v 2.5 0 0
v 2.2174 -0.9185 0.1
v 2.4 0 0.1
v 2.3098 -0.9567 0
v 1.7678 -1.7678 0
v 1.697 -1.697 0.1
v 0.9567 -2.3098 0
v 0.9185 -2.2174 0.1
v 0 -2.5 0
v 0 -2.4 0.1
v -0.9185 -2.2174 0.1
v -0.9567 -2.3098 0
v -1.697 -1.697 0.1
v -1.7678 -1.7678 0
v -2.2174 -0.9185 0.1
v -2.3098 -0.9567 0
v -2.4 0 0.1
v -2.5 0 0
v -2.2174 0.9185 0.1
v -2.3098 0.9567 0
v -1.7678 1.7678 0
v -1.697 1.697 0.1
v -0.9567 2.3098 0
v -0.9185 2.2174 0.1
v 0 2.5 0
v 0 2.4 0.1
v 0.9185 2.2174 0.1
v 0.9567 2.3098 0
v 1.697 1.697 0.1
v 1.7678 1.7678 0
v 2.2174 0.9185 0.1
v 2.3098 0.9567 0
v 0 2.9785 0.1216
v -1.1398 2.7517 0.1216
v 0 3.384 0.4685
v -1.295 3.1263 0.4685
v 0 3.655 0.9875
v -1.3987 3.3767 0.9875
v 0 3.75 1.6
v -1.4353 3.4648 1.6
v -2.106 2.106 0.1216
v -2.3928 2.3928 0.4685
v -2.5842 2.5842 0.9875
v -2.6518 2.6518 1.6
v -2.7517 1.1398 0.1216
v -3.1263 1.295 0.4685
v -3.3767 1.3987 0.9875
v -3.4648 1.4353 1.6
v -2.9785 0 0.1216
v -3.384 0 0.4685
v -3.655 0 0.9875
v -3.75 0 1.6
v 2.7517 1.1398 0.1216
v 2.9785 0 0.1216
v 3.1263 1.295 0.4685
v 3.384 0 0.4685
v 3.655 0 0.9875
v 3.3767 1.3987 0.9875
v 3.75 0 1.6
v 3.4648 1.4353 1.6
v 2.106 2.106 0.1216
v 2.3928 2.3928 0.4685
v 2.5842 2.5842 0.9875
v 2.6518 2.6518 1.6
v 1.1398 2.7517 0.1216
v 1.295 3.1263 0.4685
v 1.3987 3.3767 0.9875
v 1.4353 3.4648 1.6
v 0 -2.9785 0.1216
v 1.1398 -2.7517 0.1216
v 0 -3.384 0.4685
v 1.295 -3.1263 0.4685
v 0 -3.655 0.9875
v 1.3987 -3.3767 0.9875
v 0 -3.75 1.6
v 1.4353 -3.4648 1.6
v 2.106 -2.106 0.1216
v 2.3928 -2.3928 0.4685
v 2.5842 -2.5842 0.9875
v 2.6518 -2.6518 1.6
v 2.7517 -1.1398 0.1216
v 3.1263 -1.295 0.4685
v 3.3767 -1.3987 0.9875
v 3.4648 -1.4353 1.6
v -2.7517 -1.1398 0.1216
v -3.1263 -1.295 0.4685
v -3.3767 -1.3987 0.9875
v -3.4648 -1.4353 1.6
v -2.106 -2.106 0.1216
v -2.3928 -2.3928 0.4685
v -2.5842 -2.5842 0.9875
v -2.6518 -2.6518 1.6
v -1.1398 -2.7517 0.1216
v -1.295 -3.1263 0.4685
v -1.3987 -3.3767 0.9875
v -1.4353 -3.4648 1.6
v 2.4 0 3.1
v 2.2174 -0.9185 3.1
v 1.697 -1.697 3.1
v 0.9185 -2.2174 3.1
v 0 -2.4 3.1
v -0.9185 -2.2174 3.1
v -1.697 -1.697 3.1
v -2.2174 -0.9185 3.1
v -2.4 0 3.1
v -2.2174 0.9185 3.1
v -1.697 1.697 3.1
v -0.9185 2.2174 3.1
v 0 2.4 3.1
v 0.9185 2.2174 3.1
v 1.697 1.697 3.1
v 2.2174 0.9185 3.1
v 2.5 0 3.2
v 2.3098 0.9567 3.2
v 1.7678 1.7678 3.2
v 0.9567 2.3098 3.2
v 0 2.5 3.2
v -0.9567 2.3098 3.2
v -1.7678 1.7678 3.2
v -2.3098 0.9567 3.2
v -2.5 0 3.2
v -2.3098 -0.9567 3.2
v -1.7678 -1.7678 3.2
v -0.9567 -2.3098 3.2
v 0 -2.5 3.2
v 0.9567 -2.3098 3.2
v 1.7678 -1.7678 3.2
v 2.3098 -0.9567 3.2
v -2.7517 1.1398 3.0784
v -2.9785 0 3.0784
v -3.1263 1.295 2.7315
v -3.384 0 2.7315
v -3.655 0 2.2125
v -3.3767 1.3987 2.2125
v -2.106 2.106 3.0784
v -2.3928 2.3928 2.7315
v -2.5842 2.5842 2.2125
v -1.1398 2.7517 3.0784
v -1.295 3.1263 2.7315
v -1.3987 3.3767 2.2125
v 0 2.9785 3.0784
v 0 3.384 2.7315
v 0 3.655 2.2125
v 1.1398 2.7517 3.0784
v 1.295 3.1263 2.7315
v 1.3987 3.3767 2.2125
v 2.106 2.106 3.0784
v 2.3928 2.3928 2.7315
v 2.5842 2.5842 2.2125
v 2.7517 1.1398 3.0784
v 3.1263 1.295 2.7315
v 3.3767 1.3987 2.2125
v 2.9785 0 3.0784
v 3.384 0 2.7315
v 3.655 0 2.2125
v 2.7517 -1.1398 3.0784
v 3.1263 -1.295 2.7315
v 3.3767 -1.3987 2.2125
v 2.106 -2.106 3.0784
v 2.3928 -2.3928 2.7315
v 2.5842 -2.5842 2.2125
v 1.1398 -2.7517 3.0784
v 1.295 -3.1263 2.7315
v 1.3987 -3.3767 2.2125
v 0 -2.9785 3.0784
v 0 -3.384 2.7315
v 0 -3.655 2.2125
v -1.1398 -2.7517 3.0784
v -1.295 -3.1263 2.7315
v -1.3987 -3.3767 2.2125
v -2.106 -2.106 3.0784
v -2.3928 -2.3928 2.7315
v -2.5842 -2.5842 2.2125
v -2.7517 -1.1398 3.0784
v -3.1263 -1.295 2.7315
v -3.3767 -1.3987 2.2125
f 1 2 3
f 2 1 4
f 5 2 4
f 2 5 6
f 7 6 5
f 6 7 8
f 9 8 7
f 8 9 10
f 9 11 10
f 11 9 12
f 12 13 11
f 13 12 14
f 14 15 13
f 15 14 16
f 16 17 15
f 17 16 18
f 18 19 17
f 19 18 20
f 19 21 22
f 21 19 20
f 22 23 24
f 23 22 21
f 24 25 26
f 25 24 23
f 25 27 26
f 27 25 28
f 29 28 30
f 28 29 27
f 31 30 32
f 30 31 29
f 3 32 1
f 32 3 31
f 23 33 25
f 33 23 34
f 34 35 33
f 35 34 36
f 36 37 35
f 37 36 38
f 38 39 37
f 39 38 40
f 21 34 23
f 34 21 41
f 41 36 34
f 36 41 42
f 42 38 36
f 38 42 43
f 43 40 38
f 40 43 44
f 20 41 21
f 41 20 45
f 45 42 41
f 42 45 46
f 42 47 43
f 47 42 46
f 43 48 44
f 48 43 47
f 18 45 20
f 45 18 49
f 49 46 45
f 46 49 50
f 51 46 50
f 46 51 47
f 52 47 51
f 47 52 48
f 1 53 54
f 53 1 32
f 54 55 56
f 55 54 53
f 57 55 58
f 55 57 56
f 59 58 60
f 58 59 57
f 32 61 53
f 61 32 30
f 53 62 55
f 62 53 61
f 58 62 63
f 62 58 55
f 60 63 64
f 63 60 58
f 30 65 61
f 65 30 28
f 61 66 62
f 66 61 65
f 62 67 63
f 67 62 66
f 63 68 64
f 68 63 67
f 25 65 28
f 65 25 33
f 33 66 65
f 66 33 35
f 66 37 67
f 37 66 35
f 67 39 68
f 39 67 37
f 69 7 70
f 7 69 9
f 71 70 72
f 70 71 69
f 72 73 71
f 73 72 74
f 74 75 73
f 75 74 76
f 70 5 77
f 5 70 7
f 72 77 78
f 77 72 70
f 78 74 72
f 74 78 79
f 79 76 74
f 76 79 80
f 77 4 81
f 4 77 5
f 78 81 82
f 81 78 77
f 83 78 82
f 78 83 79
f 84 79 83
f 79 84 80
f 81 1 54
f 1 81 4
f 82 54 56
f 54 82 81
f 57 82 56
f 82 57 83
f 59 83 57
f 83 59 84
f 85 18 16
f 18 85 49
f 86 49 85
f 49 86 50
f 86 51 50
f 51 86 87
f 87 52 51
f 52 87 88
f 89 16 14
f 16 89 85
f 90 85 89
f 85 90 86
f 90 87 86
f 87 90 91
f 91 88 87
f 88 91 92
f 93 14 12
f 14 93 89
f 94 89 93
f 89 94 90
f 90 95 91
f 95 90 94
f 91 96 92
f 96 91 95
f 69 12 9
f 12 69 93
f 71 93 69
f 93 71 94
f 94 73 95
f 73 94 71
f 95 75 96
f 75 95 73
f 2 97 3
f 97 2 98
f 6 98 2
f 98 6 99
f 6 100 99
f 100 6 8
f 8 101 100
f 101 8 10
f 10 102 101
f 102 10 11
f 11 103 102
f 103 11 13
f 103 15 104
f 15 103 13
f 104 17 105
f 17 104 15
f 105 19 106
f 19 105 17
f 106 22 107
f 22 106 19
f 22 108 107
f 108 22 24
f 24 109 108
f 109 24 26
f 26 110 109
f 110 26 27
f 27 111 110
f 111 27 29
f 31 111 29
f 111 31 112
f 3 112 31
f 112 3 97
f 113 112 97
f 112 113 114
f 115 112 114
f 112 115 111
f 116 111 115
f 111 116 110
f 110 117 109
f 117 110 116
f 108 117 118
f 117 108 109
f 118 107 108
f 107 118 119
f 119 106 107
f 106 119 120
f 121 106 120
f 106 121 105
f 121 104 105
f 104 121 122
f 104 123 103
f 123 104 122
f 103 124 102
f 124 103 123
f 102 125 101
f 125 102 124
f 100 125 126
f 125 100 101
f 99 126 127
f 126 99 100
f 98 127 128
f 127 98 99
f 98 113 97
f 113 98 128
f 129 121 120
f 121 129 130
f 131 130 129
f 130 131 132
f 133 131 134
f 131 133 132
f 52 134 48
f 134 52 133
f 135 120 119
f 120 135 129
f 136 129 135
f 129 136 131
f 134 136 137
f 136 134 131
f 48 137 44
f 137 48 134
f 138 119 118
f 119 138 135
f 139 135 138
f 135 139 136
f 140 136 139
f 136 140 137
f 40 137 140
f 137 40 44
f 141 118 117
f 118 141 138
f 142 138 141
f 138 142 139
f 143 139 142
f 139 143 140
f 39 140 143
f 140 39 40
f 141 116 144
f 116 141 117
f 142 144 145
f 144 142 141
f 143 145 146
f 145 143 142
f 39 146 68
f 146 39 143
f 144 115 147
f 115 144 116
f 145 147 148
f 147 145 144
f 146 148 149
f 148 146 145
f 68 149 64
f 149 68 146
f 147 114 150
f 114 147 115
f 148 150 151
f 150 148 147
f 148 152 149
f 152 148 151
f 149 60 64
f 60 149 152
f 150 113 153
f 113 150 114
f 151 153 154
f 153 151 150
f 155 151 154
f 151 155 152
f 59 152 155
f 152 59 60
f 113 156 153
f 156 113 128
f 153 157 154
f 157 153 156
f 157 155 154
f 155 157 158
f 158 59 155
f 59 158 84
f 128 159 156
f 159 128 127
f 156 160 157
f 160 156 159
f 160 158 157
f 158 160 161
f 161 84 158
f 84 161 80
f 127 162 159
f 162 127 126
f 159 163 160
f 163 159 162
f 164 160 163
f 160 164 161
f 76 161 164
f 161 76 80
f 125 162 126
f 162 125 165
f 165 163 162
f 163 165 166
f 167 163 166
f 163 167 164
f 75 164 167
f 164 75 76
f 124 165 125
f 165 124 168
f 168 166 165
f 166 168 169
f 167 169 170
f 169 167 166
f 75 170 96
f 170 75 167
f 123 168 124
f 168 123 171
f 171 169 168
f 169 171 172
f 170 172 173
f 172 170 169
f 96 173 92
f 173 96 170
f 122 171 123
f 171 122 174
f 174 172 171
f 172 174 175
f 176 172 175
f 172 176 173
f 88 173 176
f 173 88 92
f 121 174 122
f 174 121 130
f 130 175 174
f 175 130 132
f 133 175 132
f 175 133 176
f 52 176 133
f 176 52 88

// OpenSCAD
// file: ../p/4-4cyli.scad
use <../lib.scad>
function ldraw_lib__4_4cyli() = [
// 0 Cylinder 1.0
// 0 Name: 4-4cyli.dat
// 0 Author: James Jessiman
// 0 !LDRAW_ORG Primitive UPDATE 2005-01
// 0 !LICENSE Licensed under CC BY 2.0 and CC BY 4.0 : see CAreadme.txt
// 
// 0 BFC CERTIFY CCW
  [0,"BFC","CERTIFY"],
  [0,"BFC","CCW"],
// 
// 0 !HISTORY 1998-12-15 [PTadmin] Official Update 1998-10
// 0 !HISTORY 2002-03-23 [sbliss] Added BFC statement; merged headers from files in distributions LDraw 0.27 and Complete.
// 0 !HISTORY 2002-04-25 [PTadmin] Official Update 2002-02
// 0 !HISTORY 2004-12-14 [guyvivan] BFC CCW
// 0 !HISTORY 2005-12-28 [PTadmin] Official Update 2005-01
// 0 !HISTORY 2007-06-24 [PTadmin] Header formatted for Contributor Agreement
// 0 !HISTORY 2008-07-01 [PTadmin] Official Update 2008-01
// 
// 
// 4 16 1 1 0 0.9239 1 0.3827 0.9239 0 0.3827 1 0 0
  [4,16,1,1,0,0.9239,1,0.3827,0.9239,0,0.3827,1,0,0],
// 5 24 1 0 0 1 1 0 0.9239 0 0.3827 0.9239 0 -0.3827
  [5,24,1,0,0,1,1,0,0.9239,0,0.3827,0.9239,0,-0.3827],
// 4 16 0.9239 1 0.3827 0.7071 1 0.7071 0.7071 0 0.7071 0.9239 0 0.3827
  [4,16,0.9239,1,0.3827,0.7071,1,0.7071,0.7071,0,0.7071,0.9239,0,0.3827],
// 5 24 0.9239 0 0.3827 0.9239 1 0.3827 0.7071 0 0.7071 1 0 0
  [5,24,0.9239,0,0.3827,0.9239,1,0.3827,0.7071,0,0.7071,1,0,0],
// 4 16 0.7071 1 0.7071 0.3827 1 0.9239 0.3827 0 0.9239 0.7071 0 0.7071
  [4,16,0.7071,1,0.7071,0.3827,1,0.9239,0.3827,0,0.9239,0.7071,0,0.7071],
// 5 24 0.7071 0 0.7071 0.7071 1 0.7071 0.3827 0 0.9239 0.9239 0 0.3827
  [5,24,0.7071,0,0.7071,0.7071,1,0.7071,0.3827,0,0.9239,0.9239,0,0.3827],
// 4 16 0.3827 1 0.9239 0 1 1 0 0 1 0.3827 0 0.9239
  [4,16,0.3827,1,0.9239,0,1,1,0,0,1,0.3827,0,0.9239],
// 5 24 0.3827 0 0.9239 0.3827 1 0.9239 0 0 1 0.7071 0 0.7071
  [5,24,0.3827,0,0.9239,0.3827,1,0.9239,0,0,1,0.7071,0,0.7071],
// 4 16 0 1 1 -0.3827 1 0.9239 -0.3827 0 0.9239 0 0 1
  [4,16,0,1,1,-0.3827,1,0.9239,-0.3827,0,0.9239,0,0,1],
// 5 24 0 0 1 0 1 1 -0.3827 0 0.9239 0.3827 0 0.9239
  [5,24,0,0,1,0,1,1,-0.3827,0,0.9239,0.3827,0,0.9239],
// 4 16 -0.3827 1 0.9239 -0.7071 1 0.7071 -0.7071 0 0.7071 -0.3827 0 0.9239
  [4,16,-0.3827,1,0.9239,-0.7071,1,0.7071,-0.7071,0,0.7071,-0.3827,0,0.9239],
// 5 24 -0.3827 0 0.9239 -0.3827 1 0.9239 -0.7071 0 0.7071 0 0 1
  [5,24,-0.3827,0,0.9239,-0.3827,1,0.9239,-0.7071,0,0.7071,0,0,1],
// 4 16 -0.7071 1 0.7071 -0.9239 1 0.3827 -0.9239 0 0.3827 -0.7071 0 0.7071
  [4,16,-0.7071,1,0.7071,-0.9239,1,0.3827,-0.9239,0,0.3827,-0.7071,0,0.7071],
// 5 24 -0.7071 0 0.7071 -0.7071 1 0.7071 -0.9239 0 0.3827 -0.3827 0 0.9239
  [5,24,-0.7071,0,0.7071,-0.7071,1,0.7071,-0.9239,0,0.3827,-0.3827,0,0.9239],
// 4 16 -0.9239 1 0.3827 -1 1 0 -1 0 0 -0.9239 0 0.3827
  [4,16,-0.9239,1,0.3827,-1,1,0,-1,0,0,-0.9239,0,0.3827],
// 5 24 -0.9239 0 0.3827 -0.9239 1 0.3827 -1 0 0 -0.7071 0 0.7071
  [5,24,-0.9239,0,0.3827,-0.9239,1,0.3827,-1,0,0,-0.7071,0,0.7071],
// 4 16 -1 1 0 -0.9239 1 -0.3827 -0.9239 0 -0.3827 -1 0 0
  [4,16,-1,1,0,-0.9239,1,-0.3827,-0.9239,0,-0.3827,-1,0,0],
// 5 24 -1 0 0 -1 1 0 -0.9239 0 -0.3827 -0.9239 0 0.3827
  [5,24,-1,0,0,-1,1,0,-0.9239,0,-0.3827,-0.9239,0,0.3827],
// 4 16 -0.9239 1 -0.3827 -0.7071 1 -0.7071 -0.7071 0 -0.7071 -0.9239 0 -0.3827
  [4,16,-0.9239,1,-0.3827,-0.7071,1,-0.7071,-0.7071,0,-0.7071,-0.9239,0,-0.3827],
// 5 24 -0.9239 0 -0.3827 -0.9239 1 -0.3827 -0.7071 0 -0.7071 -1 0 0
  [5,24,-0.9239,0,-0.3827,-0.9239,1,-0.3827,-0.7071,0,-0.7071,-1,0,0],
// 4 16 -0.7071 1 -0.7071 -0.3827 1 -0.9239 -0.3827 0 -0.9239 -0.7071 0 -0.7071
  [4,16,-0.7071,1,-0.7071,-0.3827,1,-0.9239,-0.3827,0,-0.9239,-0.7071,0,-0.7071],
// 5 24 -0.7071 0 -0.7071 -0.7071 1 -0.7071 -0.3827 0 -0.9239 -0.9239 0 -0.3827
  [5,24,-0.7071,0,-0.7071,-0.7071,1,-0.7071,-0.3827,0,-0.9239,-0.9239,0,-0.3827],
// 4 16 -0.3827 1 -0.9239 0 1 -1 0 0 -1 -0.3827 0 -0.9239
  [4,16,-0.3827,1,-0.9239,0,1,-1,0,0,-1,-0.3827,0,-0.9239],
// 5 24 -0.3827 0 -0.9239 -0.3827 1 -0.9239 0 0 -1 -0.7071 0 -0.7071
  [5,24,-0.3827,0,-0.9239,-0.3827,1,-0.9239,0,0,-1,-0.7071,0,-0.7071],
// 4 16 0 1 -1 0.3827 1 -0.9239 0.3827 0 -0.9239 0 0 -1
  [4,16,0,1,-1,0.3827,1,-0.9239,0.3827,0,-0.9239,0,0,-1],
// 5 24 0 0 -1 0 1 -1 0.3827 0 -0.9239 -0.3827 0 -0.9239
  [5,24,0,0,-1,0,1,-1,0.3827,0,-0.9239,-0.3827,0,-0.9239],
// 4 16 0.3827 1 -0.9239 0.7071 1 -0.7071 0.7071 0 -0.7071 0.3827 0 -0.9239
  [4,16,0.3827,1,-0.9239,0.7071,1,-0.7071,0.7071,0,-0.7071,0.3827,0,-0.9239],
// 5 24 0.3827 0 -0.9239 0.3827 1 -0.9239 0.7071 0 -0.7071 0 0 -1
  [5,24,0.3827,0,-0.9239,0.3827,1,-0.9239,0.7071,0,-0.7071,0,0,-1],
// 4 16 0.7071 1 -0.7071 0.9239 1 -0.3827 0.9239 0 -0.3827 0.7071 0 -0.7071
  [4,16,0.7071,1,-0.7071,0.9239,1,-0.3827,0.9239,0,-0.3827,0.7071,0,-0.7071],
// 5 24 0.7071 0 -0.7071 0.7071 1 -0.7071 0.9239 0 -0.3827 0.3827 0 -0.9239
  [5,24,0.7071,0,-0.7071,0.7071,1,-0.7071,0.9239,0,-0.3827,0.3827,0,-0.9239],
// 4 16 0.9239 1 -0.3827 1 1 0 1 0 0 0.9239 0 -0.3827
  [4,16,0.9239,1,-0.3827,1,1,0,1,0,0,0.9239,0,-0.3827],
// 5 24 0.9239 0 -0.3827 0.9239 1 -0.3827 1 0 0 0.7071 0 -0.7071
  [5,24,0.9239,0,-0.3827,0.9239,1,-0.3827,1,0,0,0.7071,0,-0.7071],
// 0
];
makepoly(ldraw_lib__4_4cyli(), line=0.2);
// file: ../p/4-4con24.scad
use <../lib.scad>
function ldraw_lib__4_4con24() = [
// 0 Cone 24 x 1.0
// 0 Name: 4-4con24.dat
// 0 Author: Michael Heidemann [mikeheide]
// 0 !LDRAW_ORG Primitive UPDATE 2010-03
// 0 !LICENSE Licensed under CC BY 2.0 and CC BY 4.0 : see CAreadme.txt
// 
// 0 BFC CERTIFY CCW
  [0,"BFC","CERTIFY"],
  [0,"BFC","CCW"],
// 
// 0 !HISTORY 2010-12-31 [PTadmin] Official Update 2010-03
// 
// 
// 4 16 24 1 0 22.1736 1 9.1848 23.0975 0 9.5675 25 0 0
  [4,16,24,1,0,22.1736,1,9.1848,23.0975,0,9.5675,25,0,0],
// 4 16 22.1736 1 9.1848 16.9704 1 16.9704 17.6775 0 17.6775 23.0975 0 9.5675
  [4,16,22.1736,1,9.1848,16.9704,1,16.9704,17.6775,0,17.6775,23.0975,0,9.5675],
// 4 16 16.9704 1 16.9704 9.1848 1 22.1736 9.5675 0 23.0975 17.6775 0 17.6775
  [4,16,16.9704,1,16.9704,9.1848,1,22.1736,9.5675,0,23.0975,17.6775,0,17.6775],
// 4 16 9.1848 1 22.1736 0 1 24 0 0 25 9.5675 0 23.0975
  [4,16,9.1848,1,22.1736,0,1,24,0,0,25,9.5675,0,23.0975],
// 4 16 0 1 24 -9.1848 1 22.1736 -9.5675 0 23.0975 0 0 25
  [4,16,0,1,24,-9.1848,1,22.1736,-9.5675,0,23.0975,0,0,25],
// 4 16 -9.1848 1 22.1736 -16.9704 1 16.9704 -17.6775 0 17.6775 -9.5675 0 23.0975
  [4,16,-9.1848,1,22.1736,-16.9704,1,16.9704,-17.6775,0,17.6775,-9.5675,0,23.0975],
// 4 16 -16.9704 1 16.9704 -22.1736 1 9.1848 -23.0975 0 9.5675 -17.6775 0 17.6775
  [4,16,-16.9704,1,16.9704,-22.1736,1,9.1848,-23.0975,0,9.5675,-17.6775,0,17.6775],
// 4 16 -22.1736 1 9.1848 -24 1 0 -25 0 0 -23.0975 0 9.5675
  [4,16,-22.1736,1,9.1848,-24,1,0,-25,0,0,-23.0975,0,9.5675],
// 4 16 -24 1 0 -22.1736 1 -9.1848 -23.0975 0 -9.5675 -25 0 0
  [4,16,-24,1,0,-22.1736,1,-9.1848,-23.0975,0,-9.5675,-25,0,0],
// 4 16 -22.1736 1 -9.1848 -16.9704 1 -16.9704 -17.6775 0 -17.6775 -23.0975 0 -9.5675
  [4,16,-22.1736,1,-9.1848,-16.9704,1,-16.9704,-17.6775,0,-17.6775,-23.0975,0,-9.5675],
// 4 16 -16.9704 1 -16.9704 -9.1848 1 -22.1736 -9.5675 0 -23.0975 -17.6775 0 -17.6775
  [4,16,-16.9704,1,-16.9704,-9.1848,1,-22.1736,-9.5675,0,-23.0975,-17.6775,0,-17.6775],
// 4 16 -9.1848 1 -22.1736 0 1 -24 0 0 -25 -9.5675 0 -23.0975
  [4,16,-9.1848,1,-22.1736,0,1,-24,0,0,-25,-9.5675,0,-23.0975],
// 4 16 0 1 -24 9.1848 1 -22.1736 9.5675 0 -23.0975 0 0 -25
  [4,16,0,1,-24,9.1848,1,-22.1736,9.5675,0,-23.0975,0,0,-25],
// 4 16 9.1848 1 -22.1736 16.9704 1 -16.9704 17.6775 0 -17.6775 9.5675 0 -23.0975
  [4,16,9.1848,1,-22.1736,16.9704,1,-16.9704,17.6775,0,-17.6775,9.5675,0,-23.0975],
// 4 16 16.9704 1 -16.9704 22.1736 1 -9.1848 23.0975 0 -9.5675 17.6775 0 -17.6775
  [4,16,16.9704,1,-16.9704,22.1736,1,-9.1848,23.0975,0,-9.5675,17.6775,0,-17.6775],
// 4 16 22.1736 1 -9.1848 24 1 0 25 0 0 23.0975 0 -9.5675
  [4,16,22.1736,1,-9.1848,24,1,0,25,0,0,23.0975,0,-9.5675],
// 
// 0 conditional lines
// 5 24 24 1 0 25 0 0 22.1736 1 -9.1848 22.1736 1 9.1848
  [5,24,24,1,0,25,0,0,22.1736,1,-9.1848,22.1736,1,9.1848],
// 5 24 22.1736 1 9.1848 23.0975 0 9.5675 24 1 0 16.9704 1 16.9704
  [5,24,22.1736,1,9.1848,23.0975,0,9.5675,24,1,0,16.9704,1,16.9704],
// 5 24 16.9704 1 16.9704 17.6775 0 17.6775 22.1736 1 9.1848 9.1848 1 22.1736
  [5,24,16.9704,1,16.9704,17.6775,0,17.6775,22.1736,1,9.1848,9.1848,1,22.1736],
// 5 24 9.1848 1 22.1736 9.5675 0 23.0975 16.9704 1 16.9704 0 1 24
  [5,24,9.1848,1,22.1736,9.5675,0,23.0975,16.9704,1,16.9704,0,1,24],
// 5 24 0 1 24 0 0 25 9.1848 1 22.1736 -9.1848 1 22.1736
  [5,24,0,1,24,0,0,25,9.1848,1,22.1736,-9.1848,1,22.1736],
// 5 24 -9.1848 1 22.1736 -9.5675 0 23.0975 0 1 24 -16.9704 1 16.9704
  [5,24,-9.1848,1,22.1736,-9.5675,0,23.0975,0,1,24,-16.9704,1,16.9704],
// 5 24 -16.9704 1 16.9704 -17.6775 0 17.6775 -9.1848 1 22.1736 -22.1736 1 9.1848
  [5,24,-16.9704,1,16.9704,-17.6775,0,17.6775,-9.1848,1,22.1736,-22.1736,1,9.1848],
// 5 24 -22.1736 1 9.1848 -23.0975 0 9.5675 -16.9704 1 16.9704 -24 1 0
  [5,24,-22.1736,1,9.1848,-23.0975,0,9.5675,-16.9704,1,16.9704,-24,1,0],
// 5 24 -24 1 0 -25 0 0 -22.1736 1 9.1848 -22.1736 1 -9.1848
  [5,24,-24,1,0,-25,0,0,-22.1736,1,9.1848,-22.1736,1,-9.1848],
// 5 24 -22.1736 1 -9.1848 -23.0975 0 -9.5675 -24 1 0 -16.9704 1 -16.9704
  [5,24,-22.1736,1,-9.1848,-23.0975,0,-9.5675,-24,1,0,-16.9704,1,-16.9704],
// 5 24 -16.9704 1 -16.9704 -17.6775 0 -17.6775 -22.1736 1 -9.1848 -9.1848 1 -22.1736
  [5,24,-16.9704,1,-16.9704,-17.6775,0,-17.6775,-22.1736,1,-9.1848,-9.1848,1,-22.1736],
// 5 24 -9.1848 1 -22.1736 -9.5675 0 -23.0975 -16.9704 1 -16.9704 0 1 -24
  [5,24,-9.1848,1,-22.1736,-9.5675,0,-23.0975,-16.9704,1,-16.9704,0,1,-24],
// 5 24 0 1 -24 0 0 -25 -9.1848 1 -22.1736 9.1848 1 -22.1736
  [5,24,0,1,-24,0,0,-25,-9.1848,1,-22.1736,9.1848,1,-22.1736],
// 5 24 9.1848 1 -22.1736 9.5675 0 -23.0975 0 1 -24 16.9704 1 -16.9704
  [5,24,9.1848,1,-22.1736,9.5675,0,-23.0975,0,1,-24,16.9704,1,-16.9704],
// 5 24 16.9704 1 -16.9704 17.6775 0 -17.6775 9.1848 1 -22.1736 22.1736 1 -9.1848
  [5,24,16.9704,1,-16.9704,17.6775,0,-17.6775,9.1848,1,-22.1736,22.1736,1,-9.1848],
// 5 24 22.1736 1 -9.1848 23.0975 0 -9.5675 16.9704 1 -16.9704 24 1 0
  [5,24,22.1736,1,-9.1848,23.0975,0,-9.5675,16.9704,1,-16.9704,24,1,0],
// 
// 0 end of file
// 
];
makepoly(ldraw_lib__4_4con24(), line=0.2);
// main file
use <../lib.scad>
use <../p/4-4con24.scad>
use <../p/4-4cyli.scad>
use <../p/t04o5000.scad>
function ldraw_lib__11010() = [
// 0 Minifig Ring  1 x  1
// 0 Name: 11010.dat
// 0 Author: Owen Burgoyne [C3POwen]
// 0 !LDRAW_ORG Part UPDATE 2013-01
// 0 !LICENSE Licensed under CC BY 2.0 and CC BY 4.0 : see CAreadme.txt
// 
// 0 BFC CERTIFY CCW
  [0,"BFC","CERTIFY"],
  [0,"BFC","CCW"],
// 
// 0 !CATEGORY Minifig Accessory
// 0 !KEYWORDS Bilbo Baggins, Frodo Baggins, Gollum, Lord of the Rings, Sauron
// 
// 0 !CMDLINE -c334
// 
// 0 !HISTORY 2013-07-21 [PTadmin] Official Update 2013-01
// 
// 
// 0 BFC INVERTNEXT
  [0,"BFC","INVERTNEXT"],
// 1 16 0 0 0 0.25 0 0 0 -0.25 0 0 0 -0.25 4-4con24.dat
  [1,16,0,0,0,0.25,0,0,0,-0.25,0,0,0,-0.25, ldraw_lib__4_4con24()],
// 1 16 0 -4 0 0 0 -6.25 0 8 0 6.25 0 0 t04o5000.dat
  [1,16,0,-4,0,0,0,-6.25,0,8,0,6.25,0,0, ldraw_lib__t04o5000()],
// 1 16 0 -4 0 6.25 0 0 0 8 0 0 0 6.25 t04o5000.dat
  [1,16,0,-4,0,6.25,0,0,0,8,0,0,0,6.25, ldraw_lib__t04o5000()],
// 1 16 0 -4 0 0 0 6.25 0 8 0 -6.25 0 0 t04o5000.dat
  [1,16,0,-4,0,0,0,6.25,0,8,0,-6.25,0,0, ldraw_lib__t04o5000()],
// 1 16 0 -4 0 -6.25 0 0 0 8 0 0 0 -6.25 t04o5000.dat
  [1,16,0,-4,0,-6.25,0,0,0,8,0,0,0,-6.25, ldraw_lib__t04o5000()],
// 0 BFC INVERTNEXT
  [0,"BFC","INVERTNEXT"],
// 1 16 0 -0.25 0 6 0 0 0 -7.5 0 0 0 -6 4-4cyli.dat
  [1,16,0,-0.25,0,6,0,0,0,-7.5,0,0,0,-6, ldraw_lib__4_4cyli()],
// 0 BFC INVERTNEXT
  [0,"BFC","INVERTNEXT"],
// 1 16 0 -8 0 0.25 0 0 0 0.25 0 0 0 0.25 4-4con24.dat
  [1,16,0,-8,0,0.25,0,0,0,0.25,0,0,0,0.25, ldraw_lib__4_4con24()],
// 1 16 0 -4 0 -6.25 0 0 0 -8 0 0 0 6.25 t04o5000.dat
  [1,16,0,-4,0,-6.25,0,0,0,-8,0,0,0,6.25, ldraw_lib__t04o5000()],
// 1 16 0 -4 0 0 0 6.25 0 -8 0 6.25 0 0 t04o5000.dat
  [1,16,0,-4,0,0,0,6.25,0,-8,0,6.25,0,0, ldraw_lib__t04o5000()],
// 1 16 0 -4 0 6.25 0 0 0 -8 0 0 0 -6.25 t04o5000.dat
  [1,16,0,-4,0,6.25,0,0,0,-8,0,0,0,-6.25, ldraw_lib__t04o5000()],
// 1 16 0 -4 0 0 0 -6.25 0 -8 0 -6.25 0 0 t04o5000.dat
  [1,16,0,-4,0,0,0,-6.25,0,-8,0,-6.25,0,0, ldraw_lib__t04o5000()],
// 
// 0 // Outer conditional lines
// 5 24 -5.77438 0 2.39188 -6.25 0 0 -6 -0.25 0 -7.44625 -0.304 0
  [5,24,-5.77438,0,2.39188,-6.25,0,0,-6,-0.25,0,-7.44625,-0.304,0],
// 5 24 -4.41937 0 4.41937 -5.77438 0 2.39188 -5.5434 -0.25 2.2962 -6.87937 -0.304 2.84938
  [5,24,-4.41937,0,4.41937,-5.77438,0,2.39188,-5.5434,-0.25,2.2962,-6.87937,-0.304,2.84938],
// 5 24 -2.39188 0 5.77438 -4.41937 0 4.41937 -4.2426 -0.25 4.2426 -5.265 -0.304 5.265
  [5,24,-2.39188,0,5.77438,-4.41937,0,4.41937,-4.2426,-0.25,4.2426,-5.265,-0.304,5.265],
// 5 24 0 0 6.25 -2.39188 0 5.77438 -2.2962 -0.25 5.5434 -2.84937 -0.304 6.87938
  [5,24,0,0,6.25,-2.39188,0,5.77438,-2.2962,-0.25,5.5434,-2.84937,-0.304,6.87938],
// 5 24 2.39188 0 5.77438 0 0 6.25 0 -0.25 6 0 -0.304 7.44625
  [5,24,2.39188,0,5.77438,0,0,6.25,0,-0.25,6,0,-0.304,7.44625],
// 5 24 4.41937 0 4.41937 2.39188 0 5.77438 2.2962 -0.25 5.5434 2.84938 -0.304 6.87937
  [5,24,4.41937,0,4.41937,2.39188,0,5.77438,2.2962,-0.25,5.5434,2.84938,-0.304,6.87937],
// 5 24 5.77438 0 2.39188 4.41937 0 4.41937 4.2426 -0.25 4.2426 5.265 -0.304 5.265
  [5,24,5.77438,0,2.39188,4.41937,0,4.41937,4.2426,-0.25,4.2426,5.265,-0.304,5.265],
// 5 24 6.25 0 0 5.77438 0 2.39188 5.5434 -0.25 2.2962 6.87938 -0.304 2.84937
  [5,24,6.25,0,0,5.77438,0,2.39188,5.5434,-0.25,2.2962,6.87938,-0.304,2.84937],
// 5 24 5.77438 0 -2.39188 6.25 0 0 6 -0.25 0 7.44625 -0.304 0
  [5,24,5.77438,0,-2.39188,6.25,0,0,6,-0.25,0,7.44625,-0.304,0],
// 5 24 4.41937 0 -4.41937 5.77438 0 -2.39188 5.5434 -0.25 -2.2962 6.87937 -0.304 -2.84938
  [5,24,4.41937,0,-4.41937,5.77438,0,-2.39188,5.5434,-0.25,-2.2962,6.87937,-0.304,-2.84938],
// 5 24 2.39188 0 -5.77438 4.41937 0 -4.41937 4.2426 -0.25 -4.2426 5.265 -0.304 -5.265
  [5,24,2.39188,0,-5.77438,4.41937,0,-4.41937,4.2426,-0.25,-4.2426,5.265,-0.304,-5.265],
// 5 24 0 0 -6.25 2.39188 0 -5.77438 2.2962 -0.25 -5.5434 2.84937 -0.304 -6.87938
  [5,24,0,0,-6.25,2.39188,0,-5.77438,2.2962,-0.25,-5.5434,2.84937,-0.304,-6.87938],
// 5 24 -2.39188 0 -5.77438 0 0 -6.25 0 -0.25 -6 0 -0.304 -7.44625
  [5,24,-2.39188,0,-5.77438,0,0,-6.25,0,-0.25,-6,0,-0.304,-7.44625],
// 5 24 -4.41937 0 -4.41937 -2.39188 0 -5.77438 -2.2962 -0.25 -5.5434 -2.84938 -0.304 -6.87937
  [5,24,-4.41937,0,-4.41937,-2.39188,0,-5.77438,-2.2962,-0.25,-5.5434,-2.84938,-0.304,-6.87937],
// 5 24 -5.77438 0 -2.39188 -4.41937 0 -4.41937 -4.2426 -0.25 -4.2426 -5.265 -0.304 -5.265
  [5,24,-5.77438,0,-2.39188,-4.41937,0,-4.41937,-4.2426,-0.25,-4.2426,-5.265,-0.304,-5.265],
// 5 24 -6.25 0 0 -5.77438 0 -2.39188 -5.5434 -0.25 -2.2962 -6.87938 -0.304 -2.84937
  [5,24,-6.25,0,0,-5.77438,0,-2.39188,-5.5434,-0.25,-2.2962,-6.87938,-0.304,-2.84937],
// 5 24 -2.39188 -8 5.77438 0 -8 6.25 0 -7.75 6 0 -7.696 7.44625
  [5,24,-2.39188,-8,5.77438,0,-8,6.25,0,-7.75,6,0,-7.696,7.44625],
// 5 24 -4.41937 -8 4.41937 -2.39188 -8 5.77438 -2.2962 -7.75 5.5434 -2.84938 -7.696 6.87937
  [5,24,-4.41937,-8,4.41937,-2.39188,-8,5.77438,-2.2962,-7.75,5.5434,-2.84938,-7.696,6.87937],
// 5 24 -5.77438 -8 2.39188 -4.41937 -8 4.41937 -4.2426 -7.75 4.2426 -5.265 -7.696 5.265
  [5,24,-5.77438,-8,2.39188,-4.41937,-8,4.41937,-4.2426,-7.75,4.2426,-5.265,-7.696,5.265],
// 5 24 -6.25 -8 0 -5.77438 -8 2.39188 -5.5434 -7.75 2.2962 -6.87938 -7.696 2.84937
  [5,24,-6.25,-8,0,-5.77438,-8,2.39188,-5.5434,-7.75,2.2962,-6.87938,-7.696,2.84937],
// 5 24 5.77438 -8 2.39188 6.25 -8 0 6 -7.75 0 7.44625 -7.696 0
  [5,24,5.77438,-8,2.39188,6.25,-8,0,6,-7.75,0,7.44625,-7.696,0],
// 5 24 4.41937 -8 4.41937 5.77438 -8 2.39188 5.5434 -7.75 2.2962 6.87937 -7.696 2.84938
  [5,24,4.41937,-8,4.41937,5.77438,-8,2.39188,5.5434,-7.75,2.2962,6.87937,-7.696,2.84938],
// 5 24 2.39188 -8 5.77438 4.41937 -8 4.41937 4.2426 -7.75 4.2426 5.265 -7.696 5.265
  [5,24,2.39188,-8,5.77438,4.41937,-8,4.41937,4.2426,-7.75,4.2426,5.265,-7.696,5.265],
// 5 24 0 -8 6.25 2.39188 -8 5.77438 2.2962 -7.75 5.5434 2.84937 -7.696 6.87938
  [5,24,0,-8,6.25,2.39188,-8,5.77438,2.2962,-7.75,5.5434,2.84937,-7.696,6.87938],
// 5 24 2.39188 -8 -5.77438 0 -8 -6.25 0 -7.75 -6 0 -7.696 -7.44625
  [5,24,2.39188,-8,-5.77438,0,-8,-6.25,0,-7.75,-6,0,-7.696,-7.44625],
// 5 24 4.41937 -8 -4.41937 2.39188 -8 -5.77438 2.2962 -7.75 -5.5434 2.84938 -7.696 -6.87937
  [5,24,4.41937,-8,-4.41937,2.39188,-8,-5.77438,2.2962,-7.75,-5.5434,2.84938,-7.696,-6.87937],
// 5 24 5.77438 -8 -2.39188 4.41937 -8 -4.41937 4.2426 -7.75 -4.2426 5.265 -7.696 -5.265
  [5,24,5.77438,-8,-2.39188,4.41937,-8,-4.41937,4.2426,-7.75,-4.2426,5.265,-7.696,-5.265],
// 5 24 6.25 -8 0 5.77438 -8 -2.39188 5.5434 -7.75 -2.2962 6.87938 -7.696 -2.84937
  [5,24,6.25,-8,0,5.77438,-8,-2.39188,5.5434,-7.75,-2.2962,6.87938,-7.696,-2.84937],
// 5 24 -5.77438 -8 -2.39188 -6.25 -8 0 -6 -7.75 0 -7.44625 -7.696 0
  [5,24,-5.77438,-8,-2.39188,-6.25,-8,0,-6,-7.75,0,-7.44625,-7.696,0],
// 5 24 -4.41937 -8 -4.41937 -5.77438 -8 -2.39188 -5.5434 -7.75 -2.2962 -6.87937 -7.696 -2.84938
  [5,24,-4.41937,-8,-4.41937,-5.77438,-8,-2.39188,-5.5434,-7.75,-2.2962,-6.87937,-7.696,-2.84938],
// 5 24 -2.39188 -8 -5.77438 -4.41937 -8 -4.41937 -4.2426 -7.75 -4.2426 -5.265 -7.696 -5.265
  [5,24,-2.39188,-8,-5.77438,-4.41937,-8,-4.41937,-4.2426,-7.75,-4.2426,-5.265,-7.696,-5.265],
// 5 24 0 -8 -6.25 -2.39188 -8 -5.77438 -2.2962 -7.75 -5.5434 -2.84937 -7.696 -6.87938
  [5,24,0,-8,-6.25,-2.39188,-8,-5.77438,-2.2962,-7.75,-5.5434,-2.84937,-7.696,-6.87938],
// 
// 0 // Inner conditional lines
// 5 24 -6 -0.25 0 -5.5434 -0.25 2.2962 -5.77438 0 2.39188 -6 -7.75 0
  [5,24,-6,-0.25,0,-5.5434,-0.25,2.2962,-5.77438,0,2.39188,-6,-7.75,0],
// 5 24 -5.5434 -0.25 2.2962 -4.2426 -0.25 4.2426 -4.41937 0 4.41937 -5.5434 -7.75 2.2962
  [5,24,-5.5434,-0.25,2.2962,-4.2426,-0.25,4.2426,-4.41937,0,4.41937,-5.5434,-7.75,2.2962],
// 5 24 -4.2426 -0.25 4.2426 -2.2962 -0.25 5.5434 -2.39188 0 5.77438 -4.2426 -7.75 4.2426
  [5,24,-4.2426,-0.25,4.2426,-2.2962,-0.25,5.5434,-2.39188,0,5.77438,-4.2426,-7.75,4.2426],
// 5 24 -2.2962 -0.25 5.5434 0 -0.25 6 0 0 6.25 -2.2962 -7.75 5.5434
  [5,24,-2.2962,-0.25,5.5434,0,-0.25,6,0,0,6.25,-2.2962,-7.75,5.5434],
// 5 24 0 -0.25 6 2.2962 -0.25 5.5434 2.39188 0 5.77438 0 -7.75 6
  [5,24,0,-0.25,6,2.2962,-0.25,5.5434,2.39188,0,5.77438,0,-7.75,6],
// 5 24 2.2962 -0.25 5.5434 4.2426 -0.25 4.2426 4.41937 0 4.41937 2.2962 -7.75 5.5434
  [5,24,2.2962,-0.25,5.5434,4.2426,-0.25,4.2426,4.41937,0,4.41937,2.2962,-7.75,5.5434],
// 5 24 4.2426 -0.25 4.2426 5.5434 -0.25 2.2962 5.77438 0 2.39188 4.2426 -7.75 4.2426
  [5,24,4.2426,-0.25,4.2426,5.5434,-0.25,2.2962,5.77438,0,2.39188,4.2426,-7.75,4.2426],
// 5 24 5.5434 -0.25 2.2962 6 -0.25 0 6.25 0 0 5.5434 -7.75 2.2962
  [5,24,5.5434,-0.25,2.2962,6,-0.25,0,6.25,0,0,5.5434,-7.75,2.2962],
// 5 24 6 -0.25 0 5.5434 -0.25 -2.2962 5.77438 0 -2.39188 6 -7.75 0
  [5,24,6,-0.25,0,5.5434,-0.25,-2.2962,5.77438,0,-2.39188,6,-7.75,0],
// 5 24 5.5434 -0.25 -2.2962 4.2426 -0.25 -4.2426 4.41937 0 -4.41937 5.5434 -7.75 -2.2962
  [5,24,5.5434,-0.25,-2.2962,4.2426,-0.25,-4.2426,4.41937,0,-4.41937,5.5434,-7.75,-2.2962],
// 5 24 4.2426 -0.25 -4.2426 2.2962 -0.25 -5.5434 2.39188 0 -5.77438 4.2426 -7.75 -4.2426
  [5,24,4.2426,-0.25,-4.2426,2.2962,-0.25,-5.5434,2.39188,0,-5.77438,4.2426,-7.75,-4.2426],
// 5 24 2.2962 -0.25 -5.5434 0 -0.25 -6 0 0 -6.25 2.2962 -7.75 -5.5434
  [5,24,2.2962,-0.25,-5.5434,0,-0.25,-6,0,0,-6.25,2.2962,-7.75,-5.5434],
// 5 24 0 -0.25 -6 -2.2962 -0.25 -5.5434 -2.39188 0 -5.77438 0 -7.75 -6
  [5,24,0,-0.25,-6,-2.2962,-0.25,-5.5434,-2.39188,0,-5.77438,0,-7.75,-6],
// 5 24 -2.2962 -0.25 -5.5434 -4.2426 -0.25 -4.2426 -4.41937 0 -4.41937 -2.2962 -7.75 -5.5434
  [5,24,-2.2962,-0.25,-5.5434,-4.2426,-0.25,-4.2426,-4.41937,0,-4.41937,-2.2962,-7.75,-5.5434],
// 5 24 -4.2426 -0.25 -4.2426 -5.5434 -0.25 -2.2962 -5.77438 0 -2.39188 -4.2426 -7.75 -4.2426
  [5,24,-4.2426,-0.25,-4.2426,-5.5434,-0.25,-2.2962,-5.77438,0,-2.39188,-4.2426,-7.75,-4.2426],
// 5 24 -5.5434 -0.25 -2.2962 -6 -0.25 0 -6.25 0 0 -5.5434 -7.75 -2.2962
  [5,24,-5.5434,-0.25,-2.2962,-6,-0.25,0,-6.25,0,0,-5.5434,-7.75,-2.2962],
// 5 24 0 -7.75 6 -2.2962 -7.75 5.5434 -2.39188 -8 5.77438 0 -0.25 6
  [5,24,0,-7.75,6,-2.2962,-7.75,5.5434,-2.39188,-8,5.77438,0,-0.25,6],
// 5 24 -2.2962 -7.75 5.5434 -4.2426 -7.75 4.2426 -4.41937 -8 4.41937 -2.2962 -0.25 5.5434
  [5,24,-2.2962,-7.75,5.5434,-4.2426,-7.75,4.2426,-4.41937,-8,4.41937,-2.2962,-0.25,5.5434],
// 5 24 -4.2426 -7.75 4.2426 -5.5434 -7.75 2.2962 -5.77438 -8 2.39188 -4.2426 -0.25 4.2426
  [5,24,-4.2426,-7.75,4.2426,-5.5434,-7.75,2.2962,-5.77438,-8,2.39188,-4.2426,-0.25,4.2426],
// 5 24 -5.5434 -7.75 2.2962 -6 -7.75 0 -6.25 -8 0 -5.5434 -0.25 2.2962
  [5,24,-5.5434,-7.75,2.2962,-6,-7.75,0,-6.25,-8,0,-5.5434,-0.25,2.2962],
// 5 24 6 -7.75 0 5.5434 -7.75 2.2962 5.77438 -8 2.39188 6 -0.25 0
  [5,24,6,-7.75,0,5.5434,-7.75,2.2962,5.77438,-8,2.39188,6,-0.25,0],
// 5 24 5.5434 -7.75 2.2962 4.2426 -7.75 4.2426 4.41937 -8 4.41937 5.5434 -0.25 2.2962
  [5,24,5.5434,-7.75,2.2962,4.2426,-7.75,4.2426,4.41937,-8,4.41937,5.5434,-0.25,2.2962],
// 5 24 4.2426 -7.75 4.2426 2.2962 -7.75 5.5434 2.39188 -8 5.77438 4.2426 -0.25 4.2426
  [5,24,4.2426,-7.75,4.2426,2.2962,-7.75,5.5434,2.39188,-8,5.77438,4.2426,-0.25,4.2426],
// 5 24 2.2962 -7.75 5.5434 0 -7.75 6 0 -8 6.25 2.2962 -0.25 5.5434
  [5,24,2.2962,-7.75,5.5434,0,-7.75,6,0,-8,6.25,2.2962,-0.25,5.5434],
// 5 24 0 -7.75 -6 2.2962 -7.75 -5.5434 2.39188 -8 -5.77438 0 -0.25 -6
  [5,24,0,-7.75,-6,2.2962,-7.75,-5.5434,2.39188,-8,-5.77438,0,-0.25,-6],
// 5 24 2.2962 -7.75 -5.5434 4.2426 -7.75 -4.2426 4.41937 -8 -4.41937 2.2962 -0.25 -5.5434
  [5,24,2.2962,-7.75,-5.5434,4.2426,-7.75,-4.2426,4.41937,-8,-4.41937,2.2962,-0.25,-5.5434],
// 5 24 4.2426 -7.75 -4.2426 5.5434 -7.75 -2.2962 5.77438 -8 -2.39188 4.2426 -0.25 -4.2426
  [5,24,4.2426,-7.75,-4.2426,5.5434,-7.75,-2.2962,5.77438,-8,-2.39188,4.2426,-0.25,-4.2426],
// 5 24 5.5434 -7.75 -2.2962 6 -7.75 0 6.25 -8 0 5.5434 -0.25 -2.2962
  [5,24,5.5434,-7.75,-2.2962,6,-7.75,0,6.25,-8,0,5.5434,-0.25,-2.2962],
// 5 24 -6 -7.75 0 -5.5434 -7.75 -2.2962 -5.77438 -8 -2.39188 -6 -0.25 0
  [5,24,-6,-7.75,0,-5.5434,-7.75,-2.2962,-5.77438,-8,-2.39188,-6,-0.25,0],
// 5 24 -5.5434 -7.75 -2.2962 -4.2426 -7.75 -4.2426 -4.41937 -8 -4.41937 -5.5434 -0.25 -2.2962
  [5,24,-5.5434,-7.75,-2.2962,-4.2426,-7.75,-4.2426,-4.41937,-8,-4.41937,-5.5434,-0.25,-2.2962],
// 5 24 -4.2426 -7.75 -4.2426 -2.2962 -7.75 -5.5434 -2.39188 -8 -5.77438 -4.2426 -0.25 -4.2426
  [5,24,-4.2426,-7.75,-4.2426,-2.2962,-7.75,-5.5434,-2.39188,-8,-5.77438,-4.2426,-0.25,-4.2426],
// 5 24 -2.2962 -7.75 -5.5434 0 -7.75 -6 0 -8 -6.25 -2.2962 -0.25 -5.5434
  [5,24,-2.2962,-7.75,-5.5434,0,-7.75,-6,0,-8,-6.25,-2.2962,-0.25,-5.5434],
];
makepoly(ldraw_lib__11010(), line=0.2);
